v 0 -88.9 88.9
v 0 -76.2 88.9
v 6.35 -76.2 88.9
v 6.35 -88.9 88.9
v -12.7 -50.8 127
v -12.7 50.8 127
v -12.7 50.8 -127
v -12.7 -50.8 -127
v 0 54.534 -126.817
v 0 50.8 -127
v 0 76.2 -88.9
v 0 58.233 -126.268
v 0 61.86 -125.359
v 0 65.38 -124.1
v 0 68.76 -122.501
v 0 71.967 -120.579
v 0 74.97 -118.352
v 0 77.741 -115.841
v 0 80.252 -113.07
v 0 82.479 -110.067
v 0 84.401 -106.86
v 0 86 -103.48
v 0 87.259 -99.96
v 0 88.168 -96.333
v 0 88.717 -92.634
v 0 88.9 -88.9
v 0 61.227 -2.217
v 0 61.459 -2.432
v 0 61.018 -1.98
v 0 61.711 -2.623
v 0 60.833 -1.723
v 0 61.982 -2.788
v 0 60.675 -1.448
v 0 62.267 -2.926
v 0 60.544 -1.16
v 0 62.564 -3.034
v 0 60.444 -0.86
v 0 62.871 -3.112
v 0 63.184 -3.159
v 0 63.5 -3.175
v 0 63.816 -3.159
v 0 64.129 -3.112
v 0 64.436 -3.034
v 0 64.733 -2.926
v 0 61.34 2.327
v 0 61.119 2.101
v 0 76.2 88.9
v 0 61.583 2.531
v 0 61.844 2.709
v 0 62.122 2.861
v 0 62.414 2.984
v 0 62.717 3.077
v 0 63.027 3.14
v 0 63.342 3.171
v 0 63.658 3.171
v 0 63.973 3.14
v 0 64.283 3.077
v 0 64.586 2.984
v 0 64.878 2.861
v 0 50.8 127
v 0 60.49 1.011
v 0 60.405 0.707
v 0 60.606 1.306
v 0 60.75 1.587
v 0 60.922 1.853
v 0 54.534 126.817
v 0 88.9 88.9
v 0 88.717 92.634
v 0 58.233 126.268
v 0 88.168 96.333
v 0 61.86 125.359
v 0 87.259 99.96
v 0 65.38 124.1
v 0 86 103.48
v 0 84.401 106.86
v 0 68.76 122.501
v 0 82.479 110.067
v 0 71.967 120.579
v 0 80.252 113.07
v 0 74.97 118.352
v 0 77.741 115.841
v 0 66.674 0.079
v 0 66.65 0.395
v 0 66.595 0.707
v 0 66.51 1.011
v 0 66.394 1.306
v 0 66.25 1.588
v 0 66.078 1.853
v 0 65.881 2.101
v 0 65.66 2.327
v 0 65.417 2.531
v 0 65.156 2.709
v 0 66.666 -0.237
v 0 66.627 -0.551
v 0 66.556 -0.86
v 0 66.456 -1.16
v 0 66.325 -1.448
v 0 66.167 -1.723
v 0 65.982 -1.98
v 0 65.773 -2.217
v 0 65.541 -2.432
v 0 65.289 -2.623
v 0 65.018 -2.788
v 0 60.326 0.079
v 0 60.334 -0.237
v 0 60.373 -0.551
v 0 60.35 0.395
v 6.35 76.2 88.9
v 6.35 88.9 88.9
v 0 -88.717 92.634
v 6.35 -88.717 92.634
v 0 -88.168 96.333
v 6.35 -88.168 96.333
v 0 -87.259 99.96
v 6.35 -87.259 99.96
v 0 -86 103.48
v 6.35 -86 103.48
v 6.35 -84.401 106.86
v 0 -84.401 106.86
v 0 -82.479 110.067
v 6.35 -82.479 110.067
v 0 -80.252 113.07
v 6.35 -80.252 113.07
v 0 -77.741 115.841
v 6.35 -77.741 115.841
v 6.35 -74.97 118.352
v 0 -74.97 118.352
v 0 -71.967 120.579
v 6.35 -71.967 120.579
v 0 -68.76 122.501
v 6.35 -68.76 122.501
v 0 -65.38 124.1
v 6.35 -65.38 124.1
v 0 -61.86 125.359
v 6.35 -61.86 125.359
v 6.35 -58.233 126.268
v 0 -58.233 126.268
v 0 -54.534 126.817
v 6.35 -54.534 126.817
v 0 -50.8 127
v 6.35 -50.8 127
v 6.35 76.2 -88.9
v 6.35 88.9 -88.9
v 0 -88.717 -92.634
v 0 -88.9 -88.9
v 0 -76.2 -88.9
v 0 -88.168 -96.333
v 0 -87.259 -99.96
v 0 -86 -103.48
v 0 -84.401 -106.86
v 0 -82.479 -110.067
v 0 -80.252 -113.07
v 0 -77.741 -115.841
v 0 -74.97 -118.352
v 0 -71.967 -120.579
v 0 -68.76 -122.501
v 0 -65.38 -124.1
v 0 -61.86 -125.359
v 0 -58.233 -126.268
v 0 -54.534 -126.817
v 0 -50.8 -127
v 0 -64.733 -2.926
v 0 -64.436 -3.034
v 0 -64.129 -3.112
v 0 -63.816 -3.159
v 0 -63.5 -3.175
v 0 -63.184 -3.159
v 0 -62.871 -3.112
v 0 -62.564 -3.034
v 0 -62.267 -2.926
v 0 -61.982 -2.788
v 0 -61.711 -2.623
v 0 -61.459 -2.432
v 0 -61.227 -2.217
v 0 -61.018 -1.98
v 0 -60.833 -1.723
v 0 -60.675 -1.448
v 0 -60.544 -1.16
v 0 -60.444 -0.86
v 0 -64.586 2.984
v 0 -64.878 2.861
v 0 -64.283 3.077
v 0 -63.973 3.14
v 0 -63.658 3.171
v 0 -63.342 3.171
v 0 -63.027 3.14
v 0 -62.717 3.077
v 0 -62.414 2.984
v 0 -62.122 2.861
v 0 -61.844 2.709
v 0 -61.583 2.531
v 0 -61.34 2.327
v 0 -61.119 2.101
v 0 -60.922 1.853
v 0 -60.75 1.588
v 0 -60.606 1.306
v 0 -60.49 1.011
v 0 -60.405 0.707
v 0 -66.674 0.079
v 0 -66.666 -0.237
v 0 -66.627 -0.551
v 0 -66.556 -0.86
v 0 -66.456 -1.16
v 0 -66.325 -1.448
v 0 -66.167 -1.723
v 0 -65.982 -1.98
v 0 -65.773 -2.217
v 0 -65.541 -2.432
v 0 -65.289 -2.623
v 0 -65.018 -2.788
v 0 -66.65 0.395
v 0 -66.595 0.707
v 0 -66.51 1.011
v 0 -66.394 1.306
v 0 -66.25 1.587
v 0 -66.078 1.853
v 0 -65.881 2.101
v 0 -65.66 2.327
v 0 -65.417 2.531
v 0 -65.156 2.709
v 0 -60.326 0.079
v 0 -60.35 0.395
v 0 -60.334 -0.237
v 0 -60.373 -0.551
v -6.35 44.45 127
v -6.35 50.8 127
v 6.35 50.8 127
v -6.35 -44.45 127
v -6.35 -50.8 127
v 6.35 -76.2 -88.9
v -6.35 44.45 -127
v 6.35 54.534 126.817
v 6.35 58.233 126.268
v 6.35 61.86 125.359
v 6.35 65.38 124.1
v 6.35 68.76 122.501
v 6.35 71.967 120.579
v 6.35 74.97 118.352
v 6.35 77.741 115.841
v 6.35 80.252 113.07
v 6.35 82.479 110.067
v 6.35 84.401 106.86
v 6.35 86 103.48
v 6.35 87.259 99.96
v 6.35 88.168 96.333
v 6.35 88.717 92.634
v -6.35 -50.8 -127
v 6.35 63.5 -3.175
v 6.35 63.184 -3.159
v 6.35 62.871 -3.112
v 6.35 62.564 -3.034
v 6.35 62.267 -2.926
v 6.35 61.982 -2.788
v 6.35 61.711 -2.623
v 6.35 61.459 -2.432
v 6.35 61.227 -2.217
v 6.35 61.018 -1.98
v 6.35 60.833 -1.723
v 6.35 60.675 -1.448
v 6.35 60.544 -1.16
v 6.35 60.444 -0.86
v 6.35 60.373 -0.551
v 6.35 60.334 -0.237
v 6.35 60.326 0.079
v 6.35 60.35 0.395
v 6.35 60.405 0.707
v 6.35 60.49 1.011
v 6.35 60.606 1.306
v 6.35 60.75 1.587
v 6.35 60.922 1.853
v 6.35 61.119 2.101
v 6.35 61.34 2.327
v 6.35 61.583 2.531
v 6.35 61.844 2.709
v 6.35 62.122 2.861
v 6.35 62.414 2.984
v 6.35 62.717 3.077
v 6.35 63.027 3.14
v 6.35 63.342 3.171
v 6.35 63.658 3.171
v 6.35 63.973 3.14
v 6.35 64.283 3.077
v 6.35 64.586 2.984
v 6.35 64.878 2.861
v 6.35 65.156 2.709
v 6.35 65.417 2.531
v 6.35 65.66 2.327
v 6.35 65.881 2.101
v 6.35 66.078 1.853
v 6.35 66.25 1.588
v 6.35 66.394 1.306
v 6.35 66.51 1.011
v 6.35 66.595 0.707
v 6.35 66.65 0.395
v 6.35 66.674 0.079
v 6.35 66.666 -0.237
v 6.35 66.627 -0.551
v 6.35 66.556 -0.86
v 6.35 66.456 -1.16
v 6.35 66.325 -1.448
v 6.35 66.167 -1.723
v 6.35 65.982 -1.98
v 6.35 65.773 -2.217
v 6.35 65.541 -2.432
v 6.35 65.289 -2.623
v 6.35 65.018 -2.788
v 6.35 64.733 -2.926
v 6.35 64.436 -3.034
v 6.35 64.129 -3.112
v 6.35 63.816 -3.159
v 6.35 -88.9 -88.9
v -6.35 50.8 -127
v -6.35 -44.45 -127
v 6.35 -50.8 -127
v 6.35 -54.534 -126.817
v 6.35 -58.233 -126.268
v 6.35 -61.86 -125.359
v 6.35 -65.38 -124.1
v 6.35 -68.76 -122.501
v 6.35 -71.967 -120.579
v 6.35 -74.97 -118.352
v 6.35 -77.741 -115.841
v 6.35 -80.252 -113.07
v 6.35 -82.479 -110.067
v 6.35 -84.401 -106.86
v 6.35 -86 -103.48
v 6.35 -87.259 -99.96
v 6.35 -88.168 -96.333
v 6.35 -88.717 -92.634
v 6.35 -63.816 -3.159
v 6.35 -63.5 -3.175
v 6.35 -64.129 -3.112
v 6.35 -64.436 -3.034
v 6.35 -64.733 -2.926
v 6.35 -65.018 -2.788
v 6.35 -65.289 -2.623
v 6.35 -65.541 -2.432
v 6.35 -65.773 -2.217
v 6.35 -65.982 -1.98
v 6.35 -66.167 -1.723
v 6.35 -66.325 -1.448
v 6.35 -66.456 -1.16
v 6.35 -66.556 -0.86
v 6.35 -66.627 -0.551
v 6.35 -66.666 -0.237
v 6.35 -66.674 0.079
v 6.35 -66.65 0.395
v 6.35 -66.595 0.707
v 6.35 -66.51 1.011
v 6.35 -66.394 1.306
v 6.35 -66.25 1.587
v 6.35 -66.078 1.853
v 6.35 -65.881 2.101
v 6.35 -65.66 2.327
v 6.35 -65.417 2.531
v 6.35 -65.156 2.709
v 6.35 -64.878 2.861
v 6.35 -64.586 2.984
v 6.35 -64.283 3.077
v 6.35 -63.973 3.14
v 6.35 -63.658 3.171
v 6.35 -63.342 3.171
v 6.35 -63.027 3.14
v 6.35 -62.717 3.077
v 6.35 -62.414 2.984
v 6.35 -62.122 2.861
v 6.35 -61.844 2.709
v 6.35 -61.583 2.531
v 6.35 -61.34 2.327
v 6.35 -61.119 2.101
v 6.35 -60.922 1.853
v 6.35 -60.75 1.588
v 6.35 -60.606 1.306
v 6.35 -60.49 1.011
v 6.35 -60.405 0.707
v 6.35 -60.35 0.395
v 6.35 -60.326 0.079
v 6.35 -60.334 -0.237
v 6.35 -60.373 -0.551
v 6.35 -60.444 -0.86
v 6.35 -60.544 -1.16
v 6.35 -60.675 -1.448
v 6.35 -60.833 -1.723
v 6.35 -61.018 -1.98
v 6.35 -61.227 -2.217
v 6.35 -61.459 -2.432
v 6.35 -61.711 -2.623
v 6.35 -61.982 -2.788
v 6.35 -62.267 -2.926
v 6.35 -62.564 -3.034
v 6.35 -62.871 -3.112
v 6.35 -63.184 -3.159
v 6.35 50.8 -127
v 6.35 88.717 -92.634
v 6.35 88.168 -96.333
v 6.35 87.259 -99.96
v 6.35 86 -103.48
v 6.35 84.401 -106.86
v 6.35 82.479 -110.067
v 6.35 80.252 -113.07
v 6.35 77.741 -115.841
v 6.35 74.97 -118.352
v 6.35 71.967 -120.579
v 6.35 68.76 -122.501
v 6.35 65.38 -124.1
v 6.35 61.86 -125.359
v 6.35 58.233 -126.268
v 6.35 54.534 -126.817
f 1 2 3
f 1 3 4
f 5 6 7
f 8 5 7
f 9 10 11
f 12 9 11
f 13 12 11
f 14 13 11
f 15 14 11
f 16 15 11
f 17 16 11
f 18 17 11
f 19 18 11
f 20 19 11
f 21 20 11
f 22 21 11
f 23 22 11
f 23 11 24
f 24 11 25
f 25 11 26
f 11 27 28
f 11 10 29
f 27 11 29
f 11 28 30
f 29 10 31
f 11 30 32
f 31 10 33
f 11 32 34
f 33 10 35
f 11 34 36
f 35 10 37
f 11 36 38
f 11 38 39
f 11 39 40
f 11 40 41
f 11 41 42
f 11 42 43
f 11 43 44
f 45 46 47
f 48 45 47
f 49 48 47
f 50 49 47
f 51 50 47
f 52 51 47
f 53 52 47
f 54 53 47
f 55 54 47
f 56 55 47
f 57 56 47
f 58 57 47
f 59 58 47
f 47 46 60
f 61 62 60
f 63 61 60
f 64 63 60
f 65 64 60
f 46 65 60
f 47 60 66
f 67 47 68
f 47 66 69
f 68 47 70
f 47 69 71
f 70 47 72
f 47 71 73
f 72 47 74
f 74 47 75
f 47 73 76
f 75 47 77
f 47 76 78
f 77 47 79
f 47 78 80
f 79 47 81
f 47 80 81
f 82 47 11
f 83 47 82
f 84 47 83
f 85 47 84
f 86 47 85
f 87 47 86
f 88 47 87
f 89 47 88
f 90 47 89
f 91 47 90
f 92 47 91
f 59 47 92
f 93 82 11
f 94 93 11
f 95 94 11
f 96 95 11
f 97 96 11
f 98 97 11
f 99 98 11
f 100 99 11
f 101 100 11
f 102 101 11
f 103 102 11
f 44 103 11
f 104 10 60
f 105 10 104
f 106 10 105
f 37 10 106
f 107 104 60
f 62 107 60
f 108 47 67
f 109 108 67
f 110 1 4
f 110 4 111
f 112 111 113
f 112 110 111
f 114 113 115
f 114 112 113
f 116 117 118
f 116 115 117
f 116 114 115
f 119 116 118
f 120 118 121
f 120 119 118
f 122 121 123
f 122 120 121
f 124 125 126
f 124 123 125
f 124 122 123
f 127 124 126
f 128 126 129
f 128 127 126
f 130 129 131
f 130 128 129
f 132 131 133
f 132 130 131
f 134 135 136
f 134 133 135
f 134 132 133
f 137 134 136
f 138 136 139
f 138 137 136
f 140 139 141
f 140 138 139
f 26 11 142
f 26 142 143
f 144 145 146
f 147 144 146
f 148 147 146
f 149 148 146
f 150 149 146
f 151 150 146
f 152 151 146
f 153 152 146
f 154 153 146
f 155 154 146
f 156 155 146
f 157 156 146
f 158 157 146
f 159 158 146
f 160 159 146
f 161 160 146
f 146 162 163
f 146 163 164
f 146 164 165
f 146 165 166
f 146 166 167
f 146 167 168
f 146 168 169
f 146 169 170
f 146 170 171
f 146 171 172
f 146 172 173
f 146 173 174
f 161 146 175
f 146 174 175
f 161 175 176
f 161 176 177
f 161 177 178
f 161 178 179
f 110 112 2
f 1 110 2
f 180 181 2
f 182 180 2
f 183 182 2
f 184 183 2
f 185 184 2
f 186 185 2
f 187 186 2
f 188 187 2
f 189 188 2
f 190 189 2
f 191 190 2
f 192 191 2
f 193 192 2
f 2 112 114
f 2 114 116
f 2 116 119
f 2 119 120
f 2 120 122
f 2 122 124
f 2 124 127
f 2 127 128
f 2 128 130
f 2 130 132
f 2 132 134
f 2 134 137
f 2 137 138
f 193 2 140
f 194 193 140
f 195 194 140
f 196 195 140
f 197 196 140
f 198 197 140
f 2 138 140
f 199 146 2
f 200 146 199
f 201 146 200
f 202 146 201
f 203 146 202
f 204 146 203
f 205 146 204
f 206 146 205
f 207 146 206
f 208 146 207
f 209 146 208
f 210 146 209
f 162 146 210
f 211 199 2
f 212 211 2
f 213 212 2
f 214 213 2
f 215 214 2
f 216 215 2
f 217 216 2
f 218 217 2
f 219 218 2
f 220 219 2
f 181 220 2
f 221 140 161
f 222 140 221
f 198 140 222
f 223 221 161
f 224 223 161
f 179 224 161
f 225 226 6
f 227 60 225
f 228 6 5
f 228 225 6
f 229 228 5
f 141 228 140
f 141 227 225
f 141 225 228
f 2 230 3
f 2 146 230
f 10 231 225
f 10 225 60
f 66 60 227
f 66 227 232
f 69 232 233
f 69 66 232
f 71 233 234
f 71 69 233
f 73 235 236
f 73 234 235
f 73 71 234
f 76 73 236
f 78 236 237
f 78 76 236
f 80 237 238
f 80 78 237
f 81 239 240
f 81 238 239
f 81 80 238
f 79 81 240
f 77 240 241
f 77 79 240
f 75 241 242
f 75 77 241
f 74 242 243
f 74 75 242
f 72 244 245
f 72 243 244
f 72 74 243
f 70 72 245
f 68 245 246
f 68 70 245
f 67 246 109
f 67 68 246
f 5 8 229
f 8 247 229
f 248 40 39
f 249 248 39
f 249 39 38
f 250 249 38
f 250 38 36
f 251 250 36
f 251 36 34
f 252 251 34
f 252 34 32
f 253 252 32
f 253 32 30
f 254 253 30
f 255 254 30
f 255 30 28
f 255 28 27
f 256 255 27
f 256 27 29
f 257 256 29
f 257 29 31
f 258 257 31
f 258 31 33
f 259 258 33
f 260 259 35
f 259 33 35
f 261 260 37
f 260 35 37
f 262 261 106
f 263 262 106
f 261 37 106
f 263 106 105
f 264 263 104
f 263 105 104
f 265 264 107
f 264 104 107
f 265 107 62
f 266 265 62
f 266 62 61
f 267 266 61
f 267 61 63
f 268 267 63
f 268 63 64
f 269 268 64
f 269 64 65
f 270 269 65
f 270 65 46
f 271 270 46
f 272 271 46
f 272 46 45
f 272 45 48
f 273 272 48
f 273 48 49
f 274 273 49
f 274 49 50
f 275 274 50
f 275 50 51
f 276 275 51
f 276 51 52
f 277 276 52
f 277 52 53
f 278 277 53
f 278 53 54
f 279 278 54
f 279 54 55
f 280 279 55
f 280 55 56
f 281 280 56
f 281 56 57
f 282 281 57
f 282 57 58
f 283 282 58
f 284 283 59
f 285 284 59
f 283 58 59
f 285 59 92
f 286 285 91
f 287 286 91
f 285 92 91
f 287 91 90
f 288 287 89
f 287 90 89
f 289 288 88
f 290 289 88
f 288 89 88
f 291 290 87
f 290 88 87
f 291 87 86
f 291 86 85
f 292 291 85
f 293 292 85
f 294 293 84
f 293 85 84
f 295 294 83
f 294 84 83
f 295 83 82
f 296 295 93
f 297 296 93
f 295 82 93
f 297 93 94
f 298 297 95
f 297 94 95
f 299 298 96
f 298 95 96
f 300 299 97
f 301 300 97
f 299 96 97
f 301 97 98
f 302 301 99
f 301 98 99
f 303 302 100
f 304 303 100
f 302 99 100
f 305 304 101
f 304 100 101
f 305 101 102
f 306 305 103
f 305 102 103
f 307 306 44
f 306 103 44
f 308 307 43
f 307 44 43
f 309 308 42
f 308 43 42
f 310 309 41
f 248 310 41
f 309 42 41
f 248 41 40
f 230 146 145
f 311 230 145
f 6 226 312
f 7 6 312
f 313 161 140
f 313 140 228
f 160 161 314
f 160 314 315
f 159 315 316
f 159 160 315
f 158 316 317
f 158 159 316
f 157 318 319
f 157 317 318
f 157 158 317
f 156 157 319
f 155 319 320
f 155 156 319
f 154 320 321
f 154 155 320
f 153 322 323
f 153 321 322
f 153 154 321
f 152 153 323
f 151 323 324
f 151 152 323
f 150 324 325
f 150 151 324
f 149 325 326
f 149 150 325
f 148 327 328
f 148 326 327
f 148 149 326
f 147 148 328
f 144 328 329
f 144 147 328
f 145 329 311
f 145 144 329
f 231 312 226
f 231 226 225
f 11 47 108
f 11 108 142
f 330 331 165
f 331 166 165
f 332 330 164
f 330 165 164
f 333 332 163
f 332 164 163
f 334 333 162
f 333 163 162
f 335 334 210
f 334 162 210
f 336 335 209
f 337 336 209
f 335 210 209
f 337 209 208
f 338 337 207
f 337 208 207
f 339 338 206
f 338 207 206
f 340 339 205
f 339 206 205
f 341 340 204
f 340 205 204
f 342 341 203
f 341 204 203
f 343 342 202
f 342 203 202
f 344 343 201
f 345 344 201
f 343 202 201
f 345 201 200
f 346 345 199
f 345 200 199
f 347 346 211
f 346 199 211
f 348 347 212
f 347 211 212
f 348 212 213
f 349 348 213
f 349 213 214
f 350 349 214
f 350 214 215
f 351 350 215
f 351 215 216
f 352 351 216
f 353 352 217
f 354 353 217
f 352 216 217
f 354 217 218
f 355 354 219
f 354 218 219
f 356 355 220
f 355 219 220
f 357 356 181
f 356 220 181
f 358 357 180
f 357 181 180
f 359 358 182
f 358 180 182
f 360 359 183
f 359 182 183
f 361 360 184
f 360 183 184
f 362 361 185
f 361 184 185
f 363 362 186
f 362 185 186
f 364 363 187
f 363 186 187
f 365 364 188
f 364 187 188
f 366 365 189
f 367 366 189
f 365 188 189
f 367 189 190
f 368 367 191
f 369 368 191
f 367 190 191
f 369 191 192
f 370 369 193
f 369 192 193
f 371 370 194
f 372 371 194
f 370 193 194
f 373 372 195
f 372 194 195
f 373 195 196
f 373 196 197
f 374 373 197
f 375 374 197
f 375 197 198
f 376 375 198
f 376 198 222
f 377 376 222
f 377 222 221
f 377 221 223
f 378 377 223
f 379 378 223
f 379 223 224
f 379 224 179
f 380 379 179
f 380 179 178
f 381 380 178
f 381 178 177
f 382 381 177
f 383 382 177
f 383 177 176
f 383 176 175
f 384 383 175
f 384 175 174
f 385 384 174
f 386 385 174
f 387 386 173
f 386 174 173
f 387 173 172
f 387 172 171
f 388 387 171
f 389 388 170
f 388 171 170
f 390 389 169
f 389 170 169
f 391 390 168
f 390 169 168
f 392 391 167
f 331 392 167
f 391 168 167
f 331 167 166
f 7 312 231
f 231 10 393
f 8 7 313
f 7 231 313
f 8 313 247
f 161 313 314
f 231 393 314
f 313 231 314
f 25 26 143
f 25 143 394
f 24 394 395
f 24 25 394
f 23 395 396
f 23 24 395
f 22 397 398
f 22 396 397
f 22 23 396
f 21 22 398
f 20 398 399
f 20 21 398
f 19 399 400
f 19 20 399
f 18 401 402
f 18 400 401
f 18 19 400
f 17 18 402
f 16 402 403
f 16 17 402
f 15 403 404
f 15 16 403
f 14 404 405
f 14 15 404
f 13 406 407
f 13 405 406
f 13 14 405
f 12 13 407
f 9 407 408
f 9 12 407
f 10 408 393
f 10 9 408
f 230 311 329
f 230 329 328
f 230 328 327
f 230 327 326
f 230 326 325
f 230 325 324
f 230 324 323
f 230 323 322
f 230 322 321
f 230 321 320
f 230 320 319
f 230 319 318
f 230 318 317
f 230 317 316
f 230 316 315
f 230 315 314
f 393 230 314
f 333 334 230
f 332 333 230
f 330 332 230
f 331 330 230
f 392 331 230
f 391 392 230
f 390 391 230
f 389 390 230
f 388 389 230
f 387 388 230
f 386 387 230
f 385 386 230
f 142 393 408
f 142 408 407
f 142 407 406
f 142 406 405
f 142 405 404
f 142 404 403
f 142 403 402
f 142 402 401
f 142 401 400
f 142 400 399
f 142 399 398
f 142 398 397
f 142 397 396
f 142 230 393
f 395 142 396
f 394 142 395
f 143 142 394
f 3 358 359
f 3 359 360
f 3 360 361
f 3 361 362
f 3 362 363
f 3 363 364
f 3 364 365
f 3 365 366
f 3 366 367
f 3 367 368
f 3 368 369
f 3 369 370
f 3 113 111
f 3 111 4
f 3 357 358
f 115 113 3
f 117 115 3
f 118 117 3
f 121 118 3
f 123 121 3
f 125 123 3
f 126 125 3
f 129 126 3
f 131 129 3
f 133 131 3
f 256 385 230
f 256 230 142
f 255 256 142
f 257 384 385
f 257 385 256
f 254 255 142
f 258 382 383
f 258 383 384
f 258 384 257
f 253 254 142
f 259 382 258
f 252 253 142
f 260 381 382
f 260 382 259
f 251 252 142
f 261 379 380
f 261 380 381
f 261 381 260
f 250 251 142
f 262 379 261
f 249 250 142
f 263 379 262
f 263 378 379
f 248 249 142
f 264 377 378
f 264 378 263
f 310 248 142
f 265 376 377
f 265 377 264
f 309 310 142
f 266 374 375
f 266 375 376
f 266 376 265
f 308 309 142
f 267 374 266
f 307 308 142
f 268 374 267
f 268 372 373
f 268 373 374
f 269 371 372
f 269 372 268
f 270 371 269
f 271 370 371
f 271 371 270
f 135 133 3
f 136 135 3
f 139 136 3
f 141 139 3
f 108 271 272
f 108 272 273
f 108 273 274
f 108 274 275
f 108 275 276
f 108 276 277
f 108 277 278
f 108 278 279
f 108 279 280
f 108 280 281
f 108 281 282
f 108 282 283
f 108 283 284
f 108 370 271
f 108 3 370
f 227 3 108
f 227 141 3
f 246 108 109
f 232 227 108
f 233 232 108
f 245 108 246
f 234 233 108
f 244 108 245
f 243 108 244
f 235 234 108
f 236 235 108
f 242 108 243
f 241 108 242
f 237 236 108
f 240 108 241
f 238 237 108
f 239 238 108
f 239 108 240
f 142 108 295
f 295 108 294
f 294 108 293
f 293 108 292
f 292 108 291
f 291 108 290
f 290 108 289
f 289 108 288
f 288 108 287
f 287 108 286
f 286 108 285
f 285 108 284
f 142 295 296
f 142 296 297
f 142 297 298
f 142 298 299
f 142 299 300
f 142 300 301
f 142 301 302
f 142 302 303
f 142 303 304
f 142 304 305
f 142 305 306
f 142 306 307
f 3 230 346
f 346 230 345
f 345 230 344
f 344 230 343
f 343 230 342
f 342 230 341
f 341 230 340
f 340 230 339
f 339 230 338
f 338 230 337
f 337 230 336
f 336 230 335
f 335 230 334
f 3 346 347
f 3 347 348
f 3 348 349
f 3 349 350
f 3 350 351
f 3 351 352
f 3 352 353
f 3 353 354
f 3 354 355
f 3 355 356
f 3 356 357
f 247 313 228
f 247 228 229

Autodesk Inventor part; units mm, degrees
ref_plane "YZ Plane" through (0, 0, 0) normal (1, 0, 0) x (0, 1, 0)
ref_plane "XZ Plane" through (0, 0, 0) normal (0, 1, 0) x (-1, 0, 0)
ref_plane "XY Plane" through (0, 0, 0) normal (0, 0, 1) x (1, 0, 0)
sketch "Sketch1" plane through (0, 0, 0) normal (1, 0, 0) x (0, 1, 0)
  line L0 (-76.2, 88.9) -> (-76.2, 88.9)
  line L1 (-50.8, 127) -> (50.8, 127)
  line L2 (50.8, -127) -> (-50.8, -127)
  line L3 (-76.2, -88.9) -> (-76.2, 88.9)
  arc A0 (88.9, 88.9) -> (50.8, 127) centre (50.8, 88.9) ccw
  line L4 (76.2, 88.9) -> (88.9, 88.9)
  arc A1 (-50.8, 127) -> (-88.9, 88.9) centre (-50.8, 88.9) ccw
  line L5 (-50.8, 88.9) -> (-88.9, 88.9)
  arc A2 (50.8, -127) -> (88.9, -88.9) centre (50.8, -88.9) ccw
  line L6 (76.2, -88.9) -> (88.9, -88.9)
  line L7 (76.2, 88.9) -> (76.2, -88.9)
  arc A3 (-88.9, -88.9) -> (-50.8, -127) centre (-50.8, -88.9) ccw
  line L8 (-76.2, -88.9) -> (-88.9, -88.9)
  point P0 (0, 0)
  point P1 (-76.2, 117.2981)
  point P2 (-76.2, -117.2981)
  dimension "d62" = 254
  dimension "d64" = 76.2
  dimension "d65" = 127
  dimension "d66" = 76.2
  dimension "d72" = 76.2
  dimension "d73" = 25.4
  dimension "d74" = 76.2
  dimension "d76" = 25.4
  dimension "d77" = 76.2
  dimension "d78" = 25.4
extrude "Extrusion1" add sketch "Sketch1" along normal blind 6.35
sketch "Sketch3" plane through (6.35, 0, 0) normal (1, 0, 0) x (0, 0, -1)
  line L0 (88.9, 76.2) -> (-88.9, 76.2) projected
  line L1 (127, -50.8) -> (127, 50.8) projected
  line L2 (-88.9, -76.2) -> (88.9, -76.2) projected
  point P0 (0, 0)
  point P1 (0, -63.5)
  point P2 (0, 63.5)
  point P3 (0, 63.5)
  point P4 (127, 76.2)
  point P5 (127, -76.2)
  point P6 (-127, -76.2)
  dimension "d68" = 12.7
  dimension "d69" = 127
  dimension "d70" = 127
  dimension "d71" = 12.7
hole "Hole2" at (6.35, -63.5, 0) direction (-1, 0, 0) diameter 6.35 end through all
hole "Hole3" at (6.35, 63.5, 0) direction (-1, 0, 0) diameter 6.35 end through all
sketch "Sketch4" plane through (6.35, 0, 0) normal (1, 0, 0) x (0, 0, -1)
  line L0 (-127, 50.8) -> (-127, -50.8) projected
  line L1 (-127, 50.8) -> (127, 50.8)
  line L2 (127, 50.8) -> (127, -50.8)
  line L3 (127, -50.8) -> (-127, -50.8)
  line L4 (-127, -50.8) -> (-127, 50.8)
  point P0 (0, 0)
  point P1 (-88.9, 88.9)
  dimension "d79" = 101.6
  dimension "d80" = 38.1
extrude "Extrusion2" add sketch "Sketch4" against normal blind 19.05
sketch "Sketch6" plane through (6.35, -50.8, -127) normal (0, 0, -1) x (-1, 0, 0)
  line L0 (6.35, 0) -> (0, 0) projected
  line L1 (6.35, 0) -> (12.7, 6.35)
  line L2 (6.35, 0) -> (15.3303, 0) construction
  line L3 (12.7, 6.35) -> (12.7, 0)
  line L4 (12.7, 0) -> (6.35, 0)
  point P0 (6.35, 50.8)
  dimension "d84" = 45
  dimension "d85" = 6.35
extrude "Extrusion3" cut sketch "Sketch6" against normal up to next
sketch "Sketch7" plane through (6.35, -50.8, -127) normal (0, 0, -1) x (-1, 0, 0)
  line L0 (6.35, 101.6) -> (19.05, 101.6) projected
  line L1 (6.35, 101.6) -> (12.7, 101.6)
  line L2 (12.7, 101.6) -> (12.7, 95.25)
  line L3 (12.7, 95.25) -> (6.35, 101.6)
  point P0 (6.35, 50.8)
  dimension "d92" = 6.35
extrude "Extrusion4" cut sketch "Sketch7" against normal up to next
properties part number "Frame" material "ABS Plastic"
